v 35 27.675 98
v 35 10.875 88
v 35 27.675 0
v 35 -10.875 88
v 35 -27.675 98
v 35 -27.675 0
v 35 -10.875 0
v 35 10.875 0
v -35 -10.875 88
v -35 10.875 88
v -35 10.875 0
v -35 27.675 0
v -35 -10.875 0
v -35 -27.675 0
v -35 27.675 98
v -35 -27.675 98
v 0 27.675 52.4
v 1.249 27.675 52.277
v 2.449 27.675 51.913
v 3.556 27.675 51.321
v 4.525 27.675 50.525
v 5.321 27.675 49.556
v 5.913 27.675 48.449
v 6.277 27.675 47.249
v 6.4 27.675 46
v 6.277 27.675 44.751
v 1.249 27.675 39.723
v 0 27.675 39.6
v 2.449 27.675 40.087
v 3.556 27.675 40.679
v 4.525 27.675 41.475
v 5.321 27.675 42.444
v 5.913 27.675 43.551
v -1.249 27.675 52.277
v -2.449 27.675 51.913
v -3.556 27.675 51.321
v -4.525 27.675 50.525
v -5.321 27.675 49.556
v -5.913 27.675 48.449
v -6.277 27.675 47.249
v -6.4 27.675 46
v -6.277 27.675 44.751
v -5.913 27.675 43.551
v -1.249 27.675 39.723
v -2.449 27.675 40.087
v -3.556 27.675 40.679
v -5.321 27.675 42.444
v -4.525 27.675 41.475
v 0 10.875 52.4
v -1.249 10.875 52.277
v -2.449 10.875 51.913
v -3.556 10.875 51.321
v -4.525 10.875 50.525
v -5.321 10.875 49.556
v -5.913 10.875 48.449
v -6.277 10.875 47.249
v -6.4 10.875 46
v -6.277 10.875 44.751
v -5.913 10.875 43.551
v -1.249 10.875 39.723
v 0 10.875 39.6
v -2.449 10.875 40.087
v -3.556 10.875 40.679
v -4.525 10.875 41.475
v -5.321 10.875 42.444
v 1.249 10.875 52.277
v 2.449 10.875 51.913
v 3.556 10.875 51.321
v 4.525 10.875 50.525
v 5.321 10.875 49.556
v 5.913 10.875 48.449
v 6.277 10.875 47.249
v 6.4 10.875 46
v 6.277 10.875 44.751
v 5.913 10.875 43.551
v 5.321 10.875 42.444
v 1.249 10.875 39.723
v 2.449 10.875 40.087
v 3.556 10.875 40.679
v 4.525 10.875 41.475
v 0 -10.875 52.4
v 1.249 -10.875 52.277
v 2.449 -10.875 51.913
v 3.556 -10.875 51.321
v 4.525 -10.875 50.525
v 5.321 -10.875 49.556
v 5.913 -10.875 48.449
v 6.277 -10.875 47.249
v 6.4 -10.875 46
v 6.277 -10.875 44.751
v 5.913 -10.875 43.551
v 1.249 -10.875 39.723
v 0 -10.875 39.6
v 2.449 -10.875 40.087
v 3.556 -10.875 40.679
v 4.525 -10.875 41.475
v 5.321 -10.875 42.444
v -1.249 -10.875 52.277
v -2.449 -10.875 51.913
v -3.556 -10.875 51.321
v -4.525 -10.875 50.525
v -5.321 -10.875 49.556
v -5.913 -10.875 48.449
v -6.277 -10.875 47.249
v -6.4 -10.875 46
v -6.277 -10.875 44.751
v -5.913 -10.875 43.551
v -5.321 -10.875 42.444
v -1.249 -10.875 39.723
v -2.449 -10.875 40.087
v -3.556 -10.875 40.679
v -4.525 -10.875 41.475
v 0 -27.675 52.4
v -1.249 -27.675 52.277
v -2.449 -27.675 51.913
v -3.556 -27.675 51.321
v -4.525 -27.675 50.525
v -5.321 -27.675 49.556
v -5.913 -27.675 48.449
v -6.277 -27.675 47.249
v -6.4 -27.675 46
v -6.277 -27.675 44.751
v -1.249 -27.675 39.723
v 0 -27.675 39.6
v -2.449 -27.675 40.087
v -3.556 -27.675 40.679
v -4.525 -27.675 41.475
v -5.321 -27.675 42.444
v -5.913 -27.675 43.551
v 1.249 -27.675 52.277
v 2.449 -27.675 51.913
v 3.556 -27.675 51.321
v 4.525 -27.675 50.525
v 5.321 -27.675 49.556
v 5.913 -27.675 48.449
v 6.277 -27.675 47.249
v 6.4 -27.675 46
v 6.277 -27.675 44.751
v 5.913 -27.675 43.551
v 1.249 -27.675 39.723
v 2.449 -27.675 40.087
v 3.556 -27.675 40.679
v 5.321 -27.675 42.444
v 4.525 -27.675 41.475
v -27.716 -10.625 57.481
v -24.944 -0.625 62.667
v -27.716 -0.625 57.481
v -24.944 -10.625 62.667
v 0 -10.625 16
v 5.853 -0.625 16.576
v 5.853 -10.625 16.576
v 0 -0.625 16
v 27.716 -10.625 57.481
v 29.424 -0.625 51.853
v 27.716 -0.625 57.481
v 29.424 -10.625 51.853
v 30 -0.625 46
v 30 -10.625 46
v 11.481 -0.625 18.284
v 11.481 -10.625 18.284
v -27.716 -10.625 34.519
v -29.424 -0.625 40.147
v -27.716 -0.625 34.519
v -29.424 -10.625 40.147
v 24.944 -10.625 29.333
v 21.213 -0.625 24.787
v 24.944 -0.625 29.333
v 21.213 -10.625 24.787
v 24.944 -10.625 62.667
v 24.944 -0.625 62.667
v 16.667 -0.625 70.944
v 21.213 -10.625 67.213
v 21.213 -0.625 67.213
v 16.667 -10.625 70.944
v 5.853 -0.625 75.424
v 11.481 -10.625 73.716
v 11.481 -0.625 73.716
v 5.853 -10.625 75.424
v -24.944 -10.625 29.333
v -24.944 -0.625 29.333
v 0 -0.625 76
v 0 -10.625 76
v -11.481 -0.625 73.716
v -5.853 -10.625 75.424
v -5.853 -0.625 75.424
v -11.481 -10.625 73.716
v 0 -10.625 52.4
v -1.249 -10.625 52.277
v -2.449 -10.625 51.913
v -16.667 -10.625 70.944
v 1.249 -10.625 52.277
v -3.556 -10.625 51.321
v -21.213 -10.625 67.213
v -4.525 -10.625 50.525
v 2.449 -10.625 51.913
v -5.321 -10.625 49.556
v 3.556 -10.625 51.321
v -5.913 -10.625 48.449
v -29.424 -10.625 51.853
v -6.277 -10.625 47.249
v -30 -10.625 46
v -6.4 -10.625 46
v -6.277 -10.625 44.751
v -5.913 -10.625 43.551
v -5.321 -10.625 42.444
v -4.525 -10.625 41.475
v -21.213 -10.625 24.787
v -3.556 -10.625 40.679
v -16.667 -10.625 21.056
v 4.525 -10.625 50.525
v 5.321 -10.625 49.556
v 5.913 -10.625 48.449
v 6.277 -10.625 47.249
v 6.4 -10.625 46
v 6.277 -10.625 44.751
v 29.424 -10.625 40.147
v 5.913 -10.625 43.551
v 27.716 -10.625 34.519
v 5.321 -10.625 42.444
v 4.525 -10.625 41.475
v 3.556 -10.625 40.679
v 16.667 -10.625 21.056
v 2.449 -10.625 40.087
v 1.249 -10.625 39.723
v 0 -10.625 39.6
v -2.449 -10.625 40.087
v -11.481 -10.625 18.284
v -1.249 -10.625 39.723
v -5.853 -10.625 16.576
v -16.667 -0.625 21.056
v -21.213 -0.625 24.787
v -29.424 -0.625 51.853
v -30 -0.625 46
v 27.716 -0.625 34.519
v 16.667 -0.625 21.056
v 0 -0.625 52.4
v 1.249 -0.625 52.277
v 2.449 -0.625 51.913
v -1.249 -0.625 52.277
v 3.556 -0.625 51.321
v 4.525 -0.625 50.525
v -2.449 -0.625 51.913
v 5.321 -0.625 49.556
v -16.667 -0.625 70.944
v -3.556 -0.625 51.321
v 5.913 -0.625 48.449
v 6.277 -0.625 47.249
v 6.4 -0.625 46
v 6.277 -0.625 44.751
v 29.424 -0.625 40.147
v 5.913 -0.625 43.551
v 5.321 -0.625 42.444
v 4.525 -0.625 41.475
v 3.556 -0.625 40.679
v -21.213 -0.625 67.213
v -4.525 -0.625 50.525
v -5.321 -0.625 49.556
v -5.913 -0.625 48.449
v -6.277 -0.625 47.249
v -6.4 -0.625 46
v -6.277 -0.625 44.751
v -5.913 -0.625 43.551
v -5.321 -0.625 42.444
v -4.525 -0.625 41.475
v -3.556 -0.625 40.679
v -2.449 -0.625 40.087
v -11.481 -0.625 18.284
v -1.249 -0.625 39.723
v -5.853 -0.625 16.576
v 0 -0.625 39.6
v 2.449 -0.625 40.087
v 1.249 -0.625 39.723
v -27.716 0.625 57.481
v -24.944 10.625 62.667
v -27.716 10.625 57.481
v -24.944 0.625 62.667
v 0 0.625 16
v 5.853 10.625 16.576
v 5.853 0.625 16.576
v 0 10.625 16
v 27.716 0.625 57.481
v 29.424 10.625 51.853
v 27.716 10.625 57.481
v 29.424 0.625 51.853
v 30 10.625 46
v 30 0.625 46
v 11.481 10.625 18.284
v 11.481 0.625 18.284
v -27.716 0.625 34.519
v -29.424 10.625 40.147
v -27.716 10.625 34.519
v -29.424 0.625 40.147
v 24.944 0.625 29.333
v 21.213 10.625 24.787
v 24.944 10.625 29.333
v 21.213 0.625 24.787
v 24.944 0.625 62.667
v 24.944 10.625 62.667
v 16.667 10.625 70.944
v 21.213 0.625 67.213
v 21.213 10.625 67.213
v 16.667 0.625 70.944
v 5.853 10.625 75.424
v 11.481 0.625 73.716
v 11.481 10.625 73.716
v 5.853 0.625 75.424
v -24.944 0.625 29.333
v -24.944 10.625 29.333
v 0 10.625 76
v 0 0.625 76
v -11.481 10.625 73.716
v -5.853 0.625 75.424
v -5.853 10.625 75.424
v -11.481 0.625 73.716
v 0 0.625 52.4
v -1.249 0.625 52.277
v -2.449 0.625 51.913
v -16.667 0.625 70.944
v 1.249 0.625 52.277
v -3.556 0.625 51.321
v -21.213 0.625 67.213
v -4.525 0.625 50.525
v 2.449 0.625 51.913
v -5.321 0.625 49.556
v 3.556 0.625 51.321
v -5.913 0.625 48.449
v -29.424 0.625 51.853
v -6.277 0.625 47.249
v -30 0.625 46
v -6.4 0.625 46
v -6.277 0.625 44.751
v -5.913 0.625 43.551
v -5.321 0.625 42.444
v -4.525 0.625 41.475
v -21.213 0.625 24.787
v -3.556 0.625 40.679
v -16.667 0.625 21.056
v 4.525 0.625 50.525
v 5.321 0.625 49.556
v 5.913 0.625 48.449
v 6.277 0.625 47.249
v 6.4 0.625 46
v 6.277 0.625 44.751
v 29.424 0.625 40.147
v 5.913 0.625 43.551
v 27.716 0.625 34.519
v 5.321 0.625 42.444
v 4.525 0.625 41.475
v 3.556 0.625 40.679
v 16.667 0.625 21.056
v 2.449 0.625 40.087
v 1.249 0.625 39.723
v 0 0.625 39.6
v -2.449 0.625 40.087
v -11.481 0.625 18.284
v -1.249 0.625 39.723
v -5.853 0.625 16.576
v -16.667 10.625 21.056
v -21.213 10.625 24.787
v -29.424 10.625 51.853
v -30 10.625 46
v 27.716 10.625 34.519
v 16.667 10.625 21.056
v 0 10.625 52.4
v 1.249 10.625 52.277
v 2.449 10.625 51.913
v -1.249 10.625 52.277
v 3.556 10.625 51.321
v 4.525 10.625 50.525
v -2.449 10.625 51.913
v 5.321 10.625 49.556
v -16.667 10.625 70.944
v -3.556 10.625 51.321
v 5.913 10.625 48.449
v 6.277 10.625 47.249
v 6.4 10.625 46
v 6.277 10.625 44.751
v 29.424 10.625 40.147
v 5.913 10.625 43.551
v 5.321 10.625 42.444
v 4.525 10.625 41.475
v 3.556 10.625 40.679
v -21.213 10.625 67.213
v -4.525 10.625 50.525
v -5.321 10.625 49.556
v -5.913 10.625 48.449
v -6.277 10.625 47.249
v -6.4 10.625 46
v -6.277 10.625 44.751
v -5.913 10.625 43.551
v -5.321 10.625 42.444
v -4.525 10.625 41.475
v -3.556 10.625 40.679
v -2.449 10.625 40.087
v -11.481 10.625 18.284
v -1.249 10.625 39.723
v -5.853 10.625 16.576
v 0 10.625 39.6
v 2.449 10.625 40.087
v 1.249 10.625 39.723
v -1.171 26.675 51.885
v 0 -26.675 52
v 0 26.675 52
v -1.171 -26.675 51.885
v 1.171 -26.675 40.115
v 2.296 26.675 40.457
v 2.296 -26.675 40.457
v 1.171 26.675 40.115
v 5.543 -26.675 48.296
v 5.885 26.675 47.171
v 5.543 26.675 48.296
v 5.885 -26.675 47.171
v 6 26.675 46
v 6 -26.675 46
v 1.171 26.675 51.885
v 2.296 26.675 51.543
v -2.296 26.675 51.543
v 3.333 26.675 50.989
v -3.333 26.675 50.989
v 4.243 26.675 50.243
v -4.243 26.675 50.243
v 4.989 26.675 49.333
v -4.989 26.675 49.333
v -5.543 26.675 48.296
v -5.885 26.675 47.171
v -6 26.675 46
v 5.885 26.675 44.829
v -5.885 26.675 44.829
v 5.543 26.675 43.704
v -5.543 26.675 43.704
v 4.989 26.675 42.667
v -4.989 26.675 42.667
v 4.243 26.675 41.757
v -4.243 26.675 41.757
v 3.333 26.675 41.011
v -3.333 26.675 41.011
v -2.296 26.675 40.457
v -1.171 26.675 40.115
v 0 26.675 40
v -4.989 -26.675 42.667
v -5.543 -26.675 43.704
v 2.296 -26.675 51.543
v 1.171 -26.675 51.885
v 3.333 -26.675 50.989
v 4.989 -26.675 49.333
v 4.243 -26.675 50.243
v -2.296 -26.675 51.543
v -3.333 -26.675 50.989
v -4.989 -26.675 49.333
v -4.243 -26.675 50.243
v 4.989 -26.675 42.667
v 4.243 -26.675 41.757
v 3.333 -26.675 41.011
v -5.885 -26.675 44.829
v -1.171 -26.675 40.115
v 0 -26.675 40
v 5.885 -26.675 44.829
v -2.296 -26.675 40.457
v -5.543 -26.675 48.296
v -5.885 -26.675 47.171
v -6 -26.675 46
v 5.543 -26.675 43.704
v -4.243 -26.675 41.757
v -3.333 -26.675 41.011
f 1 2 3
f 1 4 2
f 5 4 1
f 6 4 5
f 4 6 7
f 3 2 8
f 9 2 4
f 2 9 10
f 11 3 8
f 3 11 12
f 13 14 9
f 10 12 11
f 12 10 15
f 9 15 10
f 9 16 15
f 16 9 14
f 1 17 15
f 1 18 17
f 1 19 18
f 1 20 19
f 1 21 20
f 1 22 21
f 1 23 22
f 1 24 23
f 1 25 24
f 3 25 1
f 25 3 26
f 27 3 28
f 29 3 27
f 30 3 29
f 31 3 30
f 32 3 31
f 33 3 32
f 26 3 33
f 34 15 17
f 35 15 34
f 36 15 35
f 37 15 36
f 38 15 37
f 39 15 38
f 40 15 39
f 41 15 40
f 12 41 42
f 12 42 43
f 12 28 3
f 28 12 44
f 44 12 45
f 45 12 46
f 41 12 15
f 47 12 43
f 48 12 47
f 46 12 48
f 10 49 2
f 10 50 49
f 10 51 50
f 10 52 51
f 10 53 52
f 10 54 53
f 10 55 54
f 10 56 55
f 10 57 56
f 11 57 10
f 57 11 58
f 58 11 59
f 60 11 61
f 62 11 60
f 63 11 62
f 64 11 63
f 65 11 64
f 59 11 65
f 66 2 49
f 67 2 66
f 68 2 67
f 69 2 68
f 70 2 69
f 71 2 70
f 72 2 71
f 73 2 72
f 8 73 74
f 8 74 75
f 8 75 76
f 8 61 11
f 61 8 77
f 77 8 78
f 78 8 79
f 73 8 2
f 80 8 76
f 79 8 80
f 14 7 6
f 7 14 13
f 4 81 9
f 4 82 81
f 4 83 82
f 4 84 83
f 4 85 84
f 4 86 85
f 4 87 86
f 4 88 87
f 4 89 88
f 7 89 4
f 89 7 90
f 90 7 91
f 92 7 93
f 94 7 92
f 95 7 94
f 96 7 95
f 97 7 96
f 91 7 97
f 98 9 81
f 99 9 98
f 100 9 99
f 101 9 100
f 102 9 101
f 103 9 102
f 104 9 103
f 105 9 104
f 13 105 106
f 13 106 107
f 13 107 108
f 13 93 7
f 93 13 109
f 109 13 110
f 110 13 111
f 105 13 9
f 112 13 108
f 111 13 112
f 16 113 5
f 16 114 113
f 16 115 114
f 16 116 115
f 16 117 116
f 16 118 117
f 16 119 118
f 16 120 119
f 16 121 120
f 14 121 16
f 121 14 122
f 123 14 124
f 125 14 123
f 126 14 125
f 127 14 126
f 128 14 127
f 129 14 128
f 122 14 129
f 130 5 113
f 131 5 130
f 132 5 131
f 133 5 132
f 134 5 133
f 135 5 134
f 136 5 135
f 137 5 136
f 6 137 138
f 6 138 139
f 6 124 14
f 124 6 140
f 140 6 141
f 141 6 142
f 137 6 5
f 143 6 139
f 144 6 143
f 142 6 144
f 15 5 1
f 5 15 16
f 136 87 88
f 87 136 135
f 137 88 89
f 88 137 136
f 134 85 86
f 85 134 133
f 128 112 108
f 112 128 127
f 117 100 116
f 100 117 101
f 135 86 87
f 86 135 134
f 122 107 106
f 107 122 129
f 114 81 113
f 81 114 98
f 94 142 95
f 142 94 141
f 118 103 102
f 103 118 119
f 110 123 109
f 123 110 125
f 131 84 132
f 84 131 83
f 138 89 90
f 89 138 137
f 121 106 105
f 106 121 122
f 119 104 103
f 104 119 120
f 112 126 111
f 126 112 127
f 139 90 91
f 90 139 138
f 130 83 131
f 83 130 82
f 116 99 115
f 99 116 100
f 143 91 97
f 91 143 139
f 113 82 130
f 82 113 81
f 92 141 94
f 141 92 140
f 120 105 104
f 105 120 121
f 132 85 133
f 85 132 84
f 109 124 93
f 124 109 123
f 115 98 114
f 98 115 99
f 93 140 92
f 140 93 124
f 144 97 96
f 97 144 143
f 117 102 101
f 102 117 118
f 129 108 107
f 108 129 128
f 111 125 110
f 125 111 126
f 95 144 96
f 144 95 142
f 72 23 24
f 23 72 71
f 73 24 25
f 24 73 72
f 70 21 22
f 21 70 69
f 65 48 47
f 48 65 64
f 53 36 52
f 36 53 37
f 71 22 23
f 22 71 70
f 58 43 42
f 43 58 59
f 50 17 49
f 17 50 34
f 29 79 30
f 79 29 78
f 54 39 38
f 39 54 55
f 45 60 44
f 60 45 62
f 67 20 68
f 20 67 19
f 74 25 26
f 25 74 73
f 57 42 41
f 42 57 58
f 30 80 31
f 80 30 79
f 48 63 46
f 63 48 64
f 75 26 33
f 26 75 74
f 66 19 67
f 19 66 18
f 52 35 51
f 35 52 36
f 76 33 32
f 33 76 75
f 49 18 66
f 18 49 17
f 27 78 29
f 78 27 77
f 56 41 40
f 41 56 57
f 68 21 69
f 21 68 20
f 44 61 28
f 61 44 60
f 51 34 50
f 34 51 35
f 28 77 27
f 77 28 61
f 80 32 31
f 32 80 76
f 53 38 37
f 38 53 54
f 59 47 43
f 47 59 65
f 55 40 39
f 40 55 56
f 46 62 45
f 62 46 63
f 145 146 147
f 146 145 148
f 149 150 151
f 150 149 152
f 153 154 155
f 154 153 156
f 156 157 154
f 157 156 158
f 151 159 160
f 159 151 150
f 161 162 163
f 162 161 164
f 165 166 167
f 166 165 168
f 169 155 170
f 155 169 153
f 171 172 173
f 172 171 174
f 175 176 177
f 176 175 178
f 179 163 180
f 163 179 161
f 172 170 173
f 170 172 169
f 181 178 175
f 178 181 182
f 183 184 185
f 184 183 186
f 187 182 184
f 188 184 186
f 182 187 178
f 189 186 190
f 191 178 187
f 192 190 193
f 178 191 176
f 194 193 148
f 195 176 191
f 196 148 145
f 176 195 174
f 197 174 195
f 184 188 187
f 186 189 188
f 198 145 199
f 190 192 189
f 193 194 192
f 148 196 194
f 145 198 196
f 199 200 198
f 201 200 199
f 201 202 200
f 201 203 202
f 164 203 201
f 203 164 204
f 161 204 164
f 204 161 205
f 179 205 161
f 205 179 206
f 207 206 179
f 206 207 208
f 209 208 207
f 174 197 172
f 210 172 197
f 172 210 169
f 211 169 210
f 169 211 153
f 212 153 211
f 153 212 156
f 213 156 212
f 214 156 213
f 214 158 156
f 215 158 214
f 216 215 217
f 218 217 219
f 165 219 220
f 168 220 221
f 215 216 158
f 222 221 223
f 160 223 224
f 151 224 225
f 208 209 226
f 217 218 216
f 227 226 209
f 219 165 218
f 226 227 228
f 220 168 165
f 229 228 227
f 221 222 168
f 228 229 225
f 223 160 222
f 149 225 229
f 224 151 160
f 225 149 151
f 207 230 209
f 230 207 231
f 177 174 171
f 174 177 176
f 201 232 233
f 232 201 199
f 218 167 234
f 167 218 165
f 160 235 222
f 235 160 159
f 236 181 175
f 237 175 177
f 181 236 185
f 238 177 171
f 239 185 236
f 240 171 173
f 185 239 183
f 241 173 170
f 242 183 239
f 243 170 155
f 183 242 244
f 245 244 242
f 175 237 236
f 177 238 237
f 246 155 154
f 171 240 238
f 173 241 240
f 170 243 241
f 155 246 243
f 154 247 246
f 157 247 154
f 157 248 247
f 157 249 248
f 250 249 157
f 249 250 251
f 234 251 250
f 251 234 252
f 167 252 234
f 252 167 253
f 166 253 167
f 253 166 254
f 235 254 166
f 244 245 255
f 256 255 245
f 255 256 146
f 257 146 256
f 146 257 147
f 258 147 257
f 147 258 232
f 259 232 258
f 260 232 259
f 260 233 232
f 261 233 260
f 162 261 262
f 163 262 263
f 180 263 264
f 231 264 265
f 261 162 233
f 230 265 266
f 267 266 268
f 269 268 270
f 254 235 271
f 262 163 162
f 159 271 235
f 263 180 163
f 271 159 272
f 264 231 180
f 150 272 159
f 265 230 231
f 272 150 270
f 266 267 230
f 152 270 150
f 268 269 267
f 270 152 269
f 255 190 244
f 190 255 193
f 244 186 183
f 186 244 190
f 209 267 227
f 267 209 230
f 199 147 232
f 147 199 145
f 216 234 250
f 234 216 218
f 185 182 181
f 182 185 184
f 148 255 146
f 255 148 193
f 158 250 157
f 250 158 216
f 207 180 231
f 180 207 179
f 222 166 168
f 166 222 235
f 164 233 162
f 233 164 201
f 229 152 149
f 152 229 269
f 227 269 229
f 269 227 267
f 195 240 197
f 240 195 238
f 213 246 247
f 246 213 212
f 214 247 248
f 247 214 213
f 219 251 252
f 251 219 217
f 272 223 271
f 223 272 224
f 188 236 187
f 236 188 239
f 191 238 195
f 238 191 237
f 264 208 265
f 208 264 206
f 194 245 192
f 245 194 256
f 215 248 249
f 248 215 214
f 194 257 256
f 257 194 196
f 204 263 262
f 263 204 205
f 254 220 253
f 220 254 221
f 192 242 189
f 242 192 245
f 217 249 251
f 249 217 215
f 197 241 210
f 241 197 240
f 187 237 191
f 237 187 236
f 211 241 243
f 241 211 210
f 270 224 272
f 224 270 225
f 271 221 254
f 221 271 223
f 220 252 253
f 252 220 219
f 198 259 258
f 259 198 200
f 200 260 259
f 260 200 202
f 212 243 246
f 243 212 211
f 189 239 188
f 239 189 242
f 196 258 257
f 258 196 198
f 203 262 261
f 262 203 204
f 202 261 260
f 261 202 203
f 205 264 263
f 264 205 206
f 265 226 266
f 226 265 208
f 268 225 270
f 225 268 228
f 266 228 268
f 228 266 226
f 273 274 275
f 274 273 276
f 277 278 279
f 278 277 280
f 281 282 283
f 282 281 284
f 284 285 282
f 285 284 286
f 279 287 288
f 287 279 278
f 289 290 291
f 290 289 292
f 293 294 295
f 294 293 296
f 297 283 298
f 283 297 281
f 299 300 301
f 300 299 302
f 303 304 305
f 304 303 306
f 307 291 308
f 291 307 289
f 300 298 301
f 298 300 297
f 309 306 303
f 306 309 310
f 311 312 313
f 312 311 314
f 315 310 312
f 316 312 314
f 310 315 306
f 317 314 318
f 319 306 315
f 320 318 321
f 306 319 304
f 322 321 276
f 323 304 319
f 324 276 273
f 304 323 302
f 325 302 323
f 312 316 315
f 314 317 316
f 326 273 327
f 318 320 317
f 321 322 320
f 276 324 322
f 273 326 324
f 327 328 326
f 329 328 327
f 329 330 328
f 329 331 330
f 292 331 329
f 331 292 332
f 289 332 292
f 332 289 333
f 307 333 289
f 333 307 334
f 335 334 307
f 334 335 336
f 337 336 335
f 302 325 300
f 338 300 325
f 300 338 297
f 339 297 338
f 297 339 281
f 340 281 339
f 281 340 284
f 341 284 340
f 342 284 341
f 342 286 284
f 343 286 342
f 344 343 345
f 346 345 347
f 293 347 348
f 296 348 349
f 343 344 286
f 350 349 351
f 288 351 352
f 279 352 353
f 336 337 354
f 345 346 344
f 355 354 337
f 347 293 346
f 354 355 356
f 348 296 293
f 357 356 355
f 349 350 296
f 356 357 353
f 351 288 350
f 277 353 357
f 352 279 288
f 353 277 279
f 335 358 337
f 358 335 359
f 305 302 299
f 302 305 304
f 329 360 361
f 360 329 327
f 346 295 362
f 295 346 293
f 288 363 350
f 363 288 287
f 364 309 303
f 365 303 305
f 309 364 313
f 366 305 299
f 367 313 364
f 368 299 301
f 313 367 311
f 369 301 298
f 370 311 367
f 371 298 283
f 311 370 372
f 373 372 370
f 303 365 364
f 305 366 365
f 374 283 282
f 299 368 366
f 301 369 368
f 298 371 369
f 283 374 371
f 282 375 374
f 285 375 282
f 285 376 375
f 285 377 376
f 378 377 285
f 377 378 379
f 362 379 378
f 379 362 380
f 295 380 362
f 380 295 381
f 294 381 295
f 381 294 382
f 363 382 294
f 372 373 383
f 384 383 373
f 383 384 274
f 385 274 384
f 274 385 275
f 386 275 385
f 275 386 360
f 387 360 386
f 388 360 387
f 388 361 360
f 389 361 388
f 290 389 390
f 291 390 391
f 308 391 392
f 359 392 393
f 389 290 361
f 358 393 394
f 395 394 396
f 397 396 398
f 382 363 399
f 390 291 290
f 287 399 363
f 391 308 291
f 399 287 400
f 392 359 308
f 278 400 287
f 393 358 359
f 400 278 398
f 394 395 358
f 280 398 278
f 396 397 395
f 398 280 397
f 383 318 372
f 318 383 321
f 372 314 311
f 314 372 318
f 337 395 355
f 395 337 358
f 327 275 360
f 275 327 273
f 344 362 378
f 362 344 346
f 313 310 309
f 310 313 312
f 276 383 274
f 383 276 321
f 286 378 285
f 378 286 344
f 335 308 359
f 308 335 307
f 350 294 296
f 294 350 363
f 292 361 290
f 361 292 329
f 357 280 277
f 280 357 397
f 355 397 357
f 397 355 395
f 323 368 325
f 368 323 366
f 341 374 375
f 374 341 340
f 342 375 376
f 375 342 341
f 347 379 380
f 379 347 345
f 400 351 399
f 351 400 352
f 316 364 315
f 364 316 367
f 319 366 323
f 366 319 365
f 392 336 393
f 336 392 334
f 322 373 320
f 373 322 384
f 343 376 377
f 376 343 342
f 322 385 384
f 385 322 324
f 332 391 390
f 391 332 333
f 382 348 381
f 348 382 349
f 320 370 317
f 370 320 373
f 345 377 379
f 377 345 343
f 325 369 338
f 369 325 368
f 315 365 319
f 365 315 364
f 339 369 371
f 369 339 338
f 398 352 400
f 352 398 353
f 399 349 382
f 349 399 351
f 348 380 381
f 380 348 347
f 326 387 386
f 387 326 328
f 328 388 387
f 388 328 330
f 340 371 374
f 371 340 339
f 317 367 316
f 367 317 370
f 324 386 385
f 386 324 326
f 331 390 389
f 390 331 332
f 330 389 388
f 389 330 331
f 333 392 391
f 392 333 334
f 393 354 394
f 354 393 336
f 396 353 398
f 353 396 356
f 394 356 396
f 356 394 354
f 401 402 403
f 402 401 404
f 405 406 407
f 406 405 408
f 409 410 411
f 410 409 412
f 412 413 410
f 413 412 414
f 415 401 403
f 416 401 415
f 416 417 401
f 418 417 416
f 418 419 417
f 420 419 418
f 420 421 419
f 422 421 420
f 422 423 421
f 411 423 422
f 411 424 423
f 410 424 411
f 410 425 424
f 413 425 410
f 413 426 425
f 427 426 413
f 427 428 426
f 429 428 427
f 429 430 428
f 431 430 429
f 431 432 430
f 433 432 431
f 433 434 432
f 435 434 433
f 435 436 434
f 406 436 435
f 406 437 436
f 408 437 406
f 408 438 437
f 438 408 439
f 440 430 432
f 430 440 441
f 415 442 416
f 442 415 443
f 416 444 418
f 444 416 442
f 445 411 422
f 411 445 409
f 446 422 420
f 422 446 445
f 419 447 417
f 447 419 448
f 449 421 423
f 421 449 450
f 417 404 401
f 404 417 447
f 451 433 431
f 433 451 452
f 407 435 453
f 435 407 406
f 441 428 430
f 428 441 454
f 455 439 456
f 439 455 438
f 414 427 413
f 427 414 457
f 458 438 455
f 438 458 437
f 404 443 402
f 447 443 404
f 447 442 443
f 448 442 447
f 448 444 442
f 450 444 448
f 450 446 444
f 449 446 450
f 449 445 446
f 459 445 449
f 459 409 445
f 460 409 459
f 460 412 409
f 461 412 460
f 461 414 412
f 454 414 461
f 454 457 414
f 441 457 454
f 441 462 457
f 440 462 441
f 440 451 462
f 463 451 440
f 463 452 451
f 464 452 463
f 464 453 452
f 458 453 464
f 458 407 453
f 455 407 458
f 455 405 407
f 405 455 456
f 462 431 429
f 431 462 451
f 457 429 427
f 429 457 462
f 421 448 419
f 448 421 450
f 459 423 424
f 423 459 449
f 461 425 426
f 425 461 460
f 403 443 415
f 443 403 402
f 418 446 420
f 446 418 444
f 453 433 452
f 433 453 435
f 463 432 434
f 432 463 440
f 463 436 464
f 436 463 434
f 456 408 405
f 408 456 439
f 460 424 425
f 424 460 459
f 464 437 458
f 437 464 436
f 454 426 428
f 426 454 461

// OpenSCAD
$fn = 32;

// ------------------------------------------------------------------------
// Trolley wheel set: wheels d60, fork 88 mm tall
// Every part is its own module, assembly() places every instance.
// ------------------------------------------------------------------------

// --- part 1 ---
module trolley_fork() {
  difference() {
    union() {
      translate([-35, 10.875, 0]) cube([70, 16.8, 88]);
      translate([-35, -27.675, 0]) cube([70, 16.8, 88]);
      translate([-35, -27.675, 88]) cube([70, 55.35, 10]);
    }
    translate([0, -19.275, 46]) rotate([90, 0, 0]) cylinder(h = 18.8, d = 12.8, center = true);
    translate([0, 19.275, 46]) rotate([90, 0, 0]) cylinder(h = 18.8, d = 12.8, center = true);
  }
}

// --- part 2 ---
module trolley_wheel() {
  difference() {
      translate([0, 0, 0]) cylinder(h = 10, d = 60);
      translate([0, 0, -1]) cylinder(h = 12, d = 12.8);
    }
}

// --- part 3 ---
module trolley_axle() {
  translate([0, 0, -26.675]) cylinder(h = 53.35, d = 12);
}

// --- assembly ---
module assembly() {
  color([0.80, 0.24, 0.20]) translate([0, 0, 0]) rotate([0, 0, 0]) trolley_fork();
  color([0.20, 0.45, 0.75]) translate([0, -0.625, 46]) rotate([90, 0, 0]) trolley_wheel();
  color([0.25, 0.62, 0.32]) translate([0, 10.625, 46]) rotate([90, 0, 0]) trolley_wheel();
  color([0.92, 0.70, 0.18]) translate([0, 0, 46]) rotate([90, 0, 0]) trolley_axle();
}

assembly();
